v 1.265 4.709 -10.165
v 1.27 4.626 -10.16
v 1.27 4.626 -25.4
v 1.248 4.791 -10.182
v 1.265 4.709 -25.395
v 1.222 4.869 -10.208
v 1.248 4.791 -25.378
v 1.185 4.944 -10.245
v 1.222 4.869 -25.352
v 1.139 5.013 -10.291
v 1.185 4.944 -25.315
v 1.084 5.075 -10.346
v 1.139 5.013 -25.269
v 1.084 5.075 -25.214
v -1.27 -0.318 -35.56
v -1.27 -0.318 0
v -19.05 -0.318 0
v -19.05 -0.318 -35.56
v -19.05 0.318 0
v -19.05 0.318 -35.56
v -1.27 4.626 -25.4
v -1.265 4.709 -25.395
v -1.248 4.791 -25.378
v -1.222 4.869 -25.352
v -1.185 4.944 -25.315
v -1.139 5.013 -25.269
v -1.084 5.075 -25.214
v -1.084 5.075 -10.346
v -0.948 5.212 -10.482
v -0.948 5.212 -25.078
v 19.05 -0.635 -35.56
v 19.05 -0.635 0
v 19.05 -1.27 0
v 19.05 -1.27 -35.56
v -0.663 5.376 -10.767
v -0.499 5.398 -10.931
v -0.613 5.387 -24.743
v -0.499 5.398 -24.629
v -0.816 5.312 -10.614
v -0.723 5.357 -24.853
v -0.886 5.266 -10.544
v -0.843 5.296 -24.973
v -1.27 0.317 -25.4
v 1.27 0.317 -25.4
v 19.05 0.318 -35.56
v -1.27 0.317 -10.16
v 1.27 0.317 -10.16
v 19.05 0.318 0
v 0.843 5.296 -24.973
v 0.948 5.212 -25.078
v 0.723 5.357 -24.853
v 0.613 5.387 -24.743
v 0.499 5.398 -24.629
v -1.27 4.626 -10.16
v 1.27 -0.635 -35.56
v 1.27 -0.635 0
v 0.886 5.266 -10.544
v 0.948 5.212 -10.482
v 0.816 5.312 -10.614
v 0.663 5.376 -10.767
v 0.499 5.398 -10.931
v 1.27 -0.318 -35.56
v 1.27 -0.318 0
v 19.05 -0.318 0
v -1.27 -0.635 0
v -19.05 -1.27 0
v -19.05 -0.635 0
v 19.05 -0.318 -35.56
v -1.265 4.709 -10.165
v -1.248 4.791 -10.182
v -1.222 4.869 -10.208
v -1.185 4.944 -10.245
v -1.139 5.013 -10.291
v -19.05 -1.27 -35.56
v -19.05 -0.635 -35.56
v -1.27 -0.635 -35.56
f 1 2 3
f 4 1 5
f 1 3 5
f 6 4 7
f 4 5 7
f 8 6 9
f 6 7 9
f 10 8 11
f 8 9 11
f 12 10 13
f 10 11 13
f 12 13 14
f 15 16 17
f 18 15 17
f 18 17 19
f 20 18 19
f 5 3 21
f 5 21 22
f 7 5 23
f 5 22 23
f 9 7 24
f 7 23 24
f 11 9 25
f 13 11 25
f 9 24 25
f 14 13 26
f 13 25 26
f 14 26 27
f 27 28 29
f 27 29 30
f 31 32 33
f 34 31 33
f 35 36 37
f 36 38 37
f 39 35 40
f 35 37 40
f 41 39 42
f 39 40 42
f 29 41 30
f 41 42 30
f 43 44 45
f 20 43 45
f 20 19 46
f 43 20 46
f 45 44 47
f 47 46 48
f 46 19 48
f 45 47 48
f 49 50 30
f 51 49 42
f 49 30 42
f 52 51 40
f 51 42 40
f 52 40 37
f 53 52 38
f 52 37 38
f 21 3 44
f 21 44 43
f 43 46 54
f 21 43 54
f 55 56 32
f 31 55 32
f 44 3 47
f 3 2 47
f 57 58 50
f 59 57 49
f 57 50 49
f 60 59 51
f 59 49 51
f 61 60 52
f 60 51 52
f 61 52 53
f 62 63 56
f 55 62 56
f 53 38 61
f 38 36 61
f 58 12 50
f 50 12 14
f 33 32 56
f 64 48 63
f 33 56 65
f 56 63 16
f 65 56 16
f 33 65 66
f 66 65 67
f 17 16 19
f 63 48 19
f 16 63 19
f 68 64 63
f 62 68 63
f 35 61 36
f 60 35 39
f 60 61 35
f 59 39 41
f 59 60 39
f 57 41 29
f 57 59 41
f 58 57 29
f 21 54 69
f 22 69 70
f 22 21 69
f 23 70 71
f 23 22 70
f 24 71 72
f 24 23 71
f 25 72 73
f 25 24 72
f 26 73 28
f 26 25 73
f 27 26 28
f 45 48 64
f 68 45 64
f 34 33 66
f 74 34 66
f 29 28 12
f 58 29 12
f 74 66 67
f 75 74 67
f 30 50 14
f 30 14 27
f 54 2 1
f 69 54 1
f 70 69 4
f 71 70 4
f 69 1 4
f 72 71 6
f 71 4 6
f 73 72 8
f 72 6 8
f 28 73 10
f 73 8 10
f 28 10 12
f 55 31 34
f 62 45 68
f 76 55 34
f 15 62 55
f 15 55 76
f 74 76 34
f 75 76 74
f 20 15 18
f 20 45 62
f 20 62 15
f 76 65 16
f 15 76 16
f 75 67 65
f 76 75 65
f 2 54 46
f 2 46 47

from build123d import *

# Parameters (mm, degrees)
BOSS_EXTRUDE1_DEPTH = 35.56
SKETCH2_W           = 2.54
SKETCH2_H           = 5.08
CUT_EXTRUDE1_DEPTH  = 10.16
SKETCH3_W           = 2.54
SKETCH3_H           = 5.08
CUT_EXTRUDE2_DEPTH  = 10.16
CHAMFER1_SIZE       = 0.508
FILLET1_R           = 0.635


with BuildPart() as part:
    # Sketch1 → Boss-Extrude1 (new body)
    with BuildSketch(Plane.XY):
        Polygon((-19.05, -0.3175), (-19.05, 0.3175), (-1.27, 0.3175), (-1.27, 5.3975), (1.27, 5.3975), (1.27, 0.3175), (19.05, 0.3175), (19.05, -0.3175), (1.27, -0.3175), (1.27, -0.635), (19.05, -0.635), (19.05, -1.27), (-19.05, -1.27), (-19.05, -0.635), (-1.27, -0.635), (-1.27, -0.3175), align=None)
    extrude(amount=-BOSS_EXTRUDE1_DEPTH)

    # Sketch2 → Cut-Extrude1 (cut)
    with BuildSketch(Plane.XY):
        with Locations((0, 2.8575)):
            Rectangle(SKETCH2_W, SKETCH2_H)
    extrude(amount=-CUT_EXTRUDE1_DEPTH, mode=Mode.SUBTRACT)

    # Sketch3 → Cut-Extrude2 (cut)
    with BuildSketch(Plane(origin=(0, 0, -35.56), x_dir=(-1, 0, 0), z_dir=(0, 0, -1))):
        with Locations((0, 2.8575)):
            Rectangle(SKETCH3_W, SKETCH3_H)
    extrude(amount=-CUT_EXTRUDE2_DEPTH, mode=Mode.SUBTRACT)

    # Chamfer1
    chamfer1_edges = [part.edges().sort_by_distance(p)[0] for p in [
        (0, 5.3975, -10.16),
        (1.27, 5.3975, -17.78),
        (-1.27, 5.3975, -17.78),
        (0, 5.3975, -25.4),
    ]]
    chamfer(chamfer1_edges, length=CHAMFER1_SIZE)

    # Fillet1
    fillet1_edges = [part.edges().sort_by_distance(p)[0] for p in [
        (1.27, 4.8895, -17.78),
        (0, 5.3975, -24.892),
        (-0.762, 5.3975, -17.78),
        (0, 5.3975, -10.668),
        (0.762, 5.3975, -17.78),
        (0, 4.8895, -10.16),
        (-1.27, 4.8895, -17.78),
        (0, 4.8895, -25.4),
    ]]
    fillet(fillet1_edges, radius=FILLET1_R)


solid = part.part
